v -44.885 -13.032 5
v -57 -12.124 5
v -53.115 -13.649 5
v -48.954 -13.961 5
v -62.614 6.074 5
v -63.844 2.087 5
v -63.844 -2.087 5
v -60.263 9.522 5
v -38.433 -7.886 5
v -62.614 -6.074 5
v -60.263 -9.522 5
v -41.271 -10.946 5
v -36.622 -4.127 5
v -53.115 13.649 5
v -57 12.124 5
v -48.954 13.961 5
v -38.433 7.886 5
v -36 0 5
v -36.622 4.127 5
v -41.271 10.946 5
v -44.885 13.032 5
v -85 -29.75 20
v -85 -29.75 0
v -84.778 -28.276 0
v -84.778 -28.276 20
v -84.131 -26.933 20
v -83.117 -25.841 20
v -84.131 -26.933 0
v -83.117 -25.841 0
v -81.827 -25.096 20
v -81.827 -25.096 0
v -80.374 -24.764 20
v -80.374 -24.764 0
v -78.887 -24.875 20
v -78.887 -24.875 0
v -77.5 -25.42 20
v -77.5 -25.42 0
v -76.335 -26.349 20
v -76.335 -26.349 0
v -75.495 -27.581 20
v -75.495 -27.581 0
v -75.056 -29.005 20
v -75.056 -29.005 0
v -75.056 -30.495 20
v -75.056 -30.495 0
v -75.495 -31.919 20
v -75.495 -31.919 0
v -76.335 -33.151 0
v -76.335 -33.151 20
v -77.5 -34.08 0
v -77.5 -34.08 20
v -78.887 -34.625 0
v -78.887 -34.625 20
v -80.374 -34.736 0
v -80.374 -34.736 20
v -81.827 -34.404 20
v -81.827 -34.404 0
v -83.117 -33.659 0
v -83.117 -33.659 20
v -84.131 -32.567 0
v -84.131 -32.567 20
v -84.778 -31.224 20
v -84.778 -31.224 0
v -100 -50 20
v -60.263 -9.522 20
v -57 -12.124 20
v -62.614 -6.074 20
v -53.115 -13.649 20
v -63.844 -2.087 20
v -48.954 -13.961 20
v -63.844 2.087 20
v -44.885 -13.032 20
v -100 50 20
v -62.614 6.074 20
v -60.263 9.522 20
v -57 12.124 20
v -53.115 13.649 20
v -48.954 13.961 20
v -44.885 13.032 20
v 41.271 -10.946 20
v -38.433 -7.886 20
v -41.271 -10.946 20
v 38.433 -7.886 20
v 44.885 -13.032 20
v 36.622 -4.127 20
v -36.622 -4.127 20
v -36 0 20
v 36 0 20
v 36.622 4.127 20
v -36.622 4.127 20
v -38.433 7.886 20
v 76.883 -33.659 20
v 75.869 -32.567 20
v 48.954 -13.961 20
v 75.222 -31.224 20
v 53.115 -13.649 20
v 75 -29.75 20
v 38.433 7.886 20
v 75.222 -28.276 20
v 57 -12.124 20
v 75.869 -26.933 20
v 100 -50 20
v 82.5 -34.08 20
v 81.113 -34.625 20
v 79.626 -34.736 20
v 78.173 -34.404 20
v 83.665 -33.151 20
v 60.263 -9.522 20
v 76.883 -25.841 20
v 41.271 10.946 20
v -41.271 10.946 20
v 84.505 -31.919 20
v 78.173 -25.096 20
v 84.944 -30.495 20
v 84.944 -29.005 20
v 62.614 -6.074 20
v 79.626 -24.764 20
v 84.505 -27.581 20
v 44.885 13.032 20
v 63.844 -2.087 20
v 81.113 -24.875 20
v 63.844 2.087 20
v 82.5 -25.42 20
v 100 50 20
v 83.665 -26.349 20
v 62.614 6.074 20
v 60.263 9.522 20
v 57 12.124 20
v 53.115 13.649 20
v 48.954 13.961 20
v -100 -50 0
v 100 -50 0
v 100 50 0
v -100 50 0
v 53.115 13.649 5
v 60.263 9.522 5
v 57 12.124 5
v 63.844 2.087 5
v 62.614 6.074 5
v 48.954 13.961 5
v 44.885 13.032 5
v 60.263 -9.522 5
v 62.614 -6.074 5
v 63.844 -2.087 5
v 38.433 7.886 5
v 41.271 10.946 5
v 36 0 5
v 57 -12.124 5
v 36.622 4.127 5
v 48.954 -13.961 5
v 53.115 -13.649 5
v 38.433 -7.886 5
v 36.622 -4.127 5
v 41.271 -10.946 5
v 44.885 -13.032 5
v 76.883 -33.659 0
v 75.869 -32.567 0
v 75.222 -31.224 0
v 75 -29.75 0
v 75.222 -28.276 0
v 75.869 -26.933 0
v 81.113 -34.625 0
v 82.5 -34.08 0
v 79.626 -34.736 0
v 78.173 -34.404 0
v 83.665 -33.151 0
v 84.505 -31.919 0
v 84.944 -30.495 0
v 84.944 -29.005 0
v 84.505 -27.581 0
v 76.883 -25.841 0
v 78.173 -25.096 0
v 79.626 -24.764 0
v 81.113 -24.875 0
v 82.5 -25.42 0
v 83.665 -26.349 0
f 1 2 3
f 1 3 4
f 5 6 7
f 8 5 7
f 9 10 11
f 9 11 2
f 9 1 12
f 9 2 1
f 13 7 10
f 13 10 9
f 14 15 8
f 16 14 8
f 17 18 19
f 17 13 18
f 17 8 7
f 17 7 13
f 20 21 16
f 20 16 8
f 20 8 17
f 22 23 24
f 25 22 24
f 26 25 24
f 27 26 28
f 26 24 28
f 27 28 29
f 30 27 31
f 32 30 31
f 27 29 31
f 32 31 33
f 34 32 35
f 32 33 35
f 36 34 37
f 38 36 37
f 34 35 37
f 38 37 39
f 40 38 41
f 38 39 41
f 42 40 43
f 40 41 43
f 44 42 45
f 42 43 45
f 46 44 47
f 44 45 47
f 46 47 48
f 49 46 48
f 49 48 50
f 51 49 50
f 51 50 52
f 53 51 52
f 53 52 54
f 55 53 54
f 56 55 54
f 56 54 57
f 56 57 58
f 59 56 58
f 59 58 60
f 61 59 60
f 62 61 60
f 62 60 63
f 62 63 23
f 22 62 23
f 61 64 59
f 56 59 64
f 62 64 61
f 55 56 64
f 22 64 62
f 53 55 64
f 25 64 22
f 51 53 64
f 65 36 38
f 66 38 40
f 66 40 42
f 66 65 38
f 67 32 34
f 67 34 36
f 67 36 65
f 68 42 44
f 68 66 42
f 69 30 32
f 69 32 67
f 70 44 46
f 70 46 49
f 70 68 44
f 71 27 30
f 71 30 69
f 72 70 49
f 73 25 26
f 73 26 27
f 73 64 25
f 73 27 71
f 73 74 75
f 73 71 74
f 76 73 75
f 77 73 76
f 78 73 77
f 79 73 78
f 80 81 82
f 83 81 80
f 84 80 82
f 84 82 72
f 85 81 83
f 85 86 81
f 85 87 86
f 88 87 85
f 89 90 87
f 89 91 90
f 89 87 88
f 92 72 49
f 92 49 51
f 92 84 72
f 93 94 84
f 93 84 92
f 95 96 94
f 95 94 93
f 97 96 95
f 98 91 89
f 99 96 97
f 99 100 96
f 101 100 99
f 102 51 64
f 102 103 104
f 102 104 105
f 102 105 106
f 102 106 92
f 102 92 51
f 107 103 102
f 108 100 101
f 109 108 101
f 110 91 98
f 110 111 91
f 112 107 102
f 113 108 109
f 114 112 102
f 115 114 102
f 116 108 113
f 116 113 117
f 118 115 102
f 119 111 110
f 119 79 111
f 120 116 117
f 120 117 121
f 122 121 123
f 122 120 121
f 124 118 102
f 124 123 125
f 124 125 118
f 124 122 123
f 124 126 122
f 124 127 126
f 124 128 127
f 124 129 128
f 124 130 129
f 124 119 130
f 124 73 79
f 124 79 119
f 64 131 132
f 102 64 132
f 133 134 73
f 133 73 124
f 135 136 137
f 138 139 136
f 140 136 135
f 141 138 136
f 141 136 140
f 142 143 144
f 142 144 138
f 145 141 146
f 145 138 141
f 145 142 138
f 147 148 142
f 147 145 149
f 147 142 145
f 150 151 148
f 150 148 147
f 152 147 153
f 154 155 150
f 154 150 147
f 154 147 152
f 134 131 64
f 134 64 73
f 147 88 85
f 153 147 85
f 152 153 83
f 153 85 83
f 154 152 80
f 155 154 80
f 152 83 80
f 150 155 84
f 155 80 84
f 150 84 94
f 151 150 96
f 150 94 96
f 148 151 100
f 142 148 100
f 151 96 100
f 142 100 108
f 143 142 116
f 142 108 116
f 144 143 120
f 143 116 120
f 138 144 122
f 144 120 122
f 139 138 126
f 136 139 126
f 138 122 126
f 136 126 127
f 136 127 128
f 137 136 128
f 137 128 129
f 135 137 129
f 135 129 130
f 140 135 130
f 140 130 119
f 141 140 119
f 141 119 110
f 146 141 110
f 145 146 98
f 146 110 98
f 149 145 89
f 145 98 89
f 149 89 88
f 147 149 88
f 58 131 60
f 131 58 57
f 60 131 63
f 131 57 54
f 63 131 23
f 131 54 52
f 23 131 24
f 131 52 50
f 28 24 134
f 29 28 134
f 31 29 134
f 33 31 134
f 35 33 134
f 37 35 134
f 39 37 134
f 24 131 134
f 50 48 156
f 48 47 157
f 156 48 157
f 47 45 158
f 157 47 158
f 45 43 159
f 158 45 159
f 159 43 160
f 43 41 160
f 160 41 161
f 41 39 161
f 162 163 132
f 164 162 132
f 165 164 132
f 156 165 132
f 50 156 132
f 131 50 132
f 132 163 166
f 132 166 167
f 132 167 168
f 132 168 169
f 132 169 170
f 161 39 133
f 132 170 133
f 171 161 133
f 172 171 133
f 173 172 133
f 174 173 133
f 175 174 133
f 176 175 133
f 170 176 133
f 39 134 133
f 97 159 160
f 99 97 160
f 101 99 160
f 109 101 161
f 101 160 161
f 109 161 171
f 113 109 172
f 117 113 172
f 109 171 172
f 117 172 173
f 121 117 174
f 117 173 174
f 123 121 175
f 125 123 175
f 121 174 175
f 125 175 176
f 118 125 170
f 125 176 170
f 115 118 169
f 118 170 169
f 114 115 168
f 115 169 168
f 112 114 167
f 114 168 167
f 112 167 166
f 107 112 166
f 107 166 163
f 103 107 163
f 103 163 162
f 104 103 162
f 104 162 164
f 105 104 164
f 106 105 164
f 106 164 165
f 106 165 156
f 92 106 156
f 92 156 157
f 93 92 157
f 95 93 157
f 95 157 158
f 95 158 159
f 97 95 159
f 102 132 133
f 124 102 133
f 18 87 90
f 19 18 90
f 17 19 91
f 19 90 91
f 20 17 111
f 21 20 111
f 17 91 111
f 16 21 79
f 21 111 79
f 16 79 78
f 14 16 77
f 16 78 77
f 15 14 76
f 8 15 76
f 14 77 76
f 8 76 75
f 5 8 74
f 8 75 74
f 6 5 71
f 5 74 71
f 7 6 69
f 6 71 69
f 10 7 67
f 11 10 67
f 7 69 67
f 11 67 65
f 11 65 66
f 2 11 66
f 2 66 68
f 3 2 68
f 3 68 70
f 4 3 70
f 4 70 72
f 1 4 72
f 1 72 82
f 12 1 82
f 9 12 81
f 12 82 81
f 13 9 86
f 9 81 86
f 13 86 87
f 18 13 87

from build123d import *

# Parameters (mm, degrees)
SKETCH1_W           = 200
SKETCH1_H           = 100
BOSS_EXTRUDE1_DEPTH = 20
SKETCH2_R           = 14
CUT_EXTRUDE1_DEPTH  = 15
SKETCH4_R           = 5
CUT_EXTRUDE3_DEPTH  = 114.578166916


with BuildPart() as part:
    # Sketch1 → Boss-Extrude1 (new body)
    with BuildSketch(Plane.XY):
        Rectangle(SKETCH1_W, SKETCH1_H)
    extrude(amount=BOSS_EXTRUDE1_DEPTH)

    # Sketch2 → Cut-Extrude1 (cut)
    with BuildSketch(Plane.XY.offset(20)):
        with Locations((-50, 0)):
            Circle(SKETCH2_R)
        with Locations(Location((50, 0, 0), (0, 0, 180))):
            Circle(SKETCH2_R)
    extrude(amount=-CUT_EXTRUDE1_DEPTH, mode=Mode.SUBTRACT)

    # Sketch4 → Cut-Extrude3 (cut, through all)
    with BuildSketch(Plane(origin=(0, 0, 0), x_dir=(-1, 0, 0), z_dir=(0, 0, -1))):
        with Locations((-80, -29.75)):
            Circle(SKETCH4_R)
        with Locations((80, -29.75)):
            Circle(SKETCH4_R)
    extrude(amount=-CUT_EXTRUDE3_DEPTH, mode=Mode.SUBTRACT)


solid = part.part
